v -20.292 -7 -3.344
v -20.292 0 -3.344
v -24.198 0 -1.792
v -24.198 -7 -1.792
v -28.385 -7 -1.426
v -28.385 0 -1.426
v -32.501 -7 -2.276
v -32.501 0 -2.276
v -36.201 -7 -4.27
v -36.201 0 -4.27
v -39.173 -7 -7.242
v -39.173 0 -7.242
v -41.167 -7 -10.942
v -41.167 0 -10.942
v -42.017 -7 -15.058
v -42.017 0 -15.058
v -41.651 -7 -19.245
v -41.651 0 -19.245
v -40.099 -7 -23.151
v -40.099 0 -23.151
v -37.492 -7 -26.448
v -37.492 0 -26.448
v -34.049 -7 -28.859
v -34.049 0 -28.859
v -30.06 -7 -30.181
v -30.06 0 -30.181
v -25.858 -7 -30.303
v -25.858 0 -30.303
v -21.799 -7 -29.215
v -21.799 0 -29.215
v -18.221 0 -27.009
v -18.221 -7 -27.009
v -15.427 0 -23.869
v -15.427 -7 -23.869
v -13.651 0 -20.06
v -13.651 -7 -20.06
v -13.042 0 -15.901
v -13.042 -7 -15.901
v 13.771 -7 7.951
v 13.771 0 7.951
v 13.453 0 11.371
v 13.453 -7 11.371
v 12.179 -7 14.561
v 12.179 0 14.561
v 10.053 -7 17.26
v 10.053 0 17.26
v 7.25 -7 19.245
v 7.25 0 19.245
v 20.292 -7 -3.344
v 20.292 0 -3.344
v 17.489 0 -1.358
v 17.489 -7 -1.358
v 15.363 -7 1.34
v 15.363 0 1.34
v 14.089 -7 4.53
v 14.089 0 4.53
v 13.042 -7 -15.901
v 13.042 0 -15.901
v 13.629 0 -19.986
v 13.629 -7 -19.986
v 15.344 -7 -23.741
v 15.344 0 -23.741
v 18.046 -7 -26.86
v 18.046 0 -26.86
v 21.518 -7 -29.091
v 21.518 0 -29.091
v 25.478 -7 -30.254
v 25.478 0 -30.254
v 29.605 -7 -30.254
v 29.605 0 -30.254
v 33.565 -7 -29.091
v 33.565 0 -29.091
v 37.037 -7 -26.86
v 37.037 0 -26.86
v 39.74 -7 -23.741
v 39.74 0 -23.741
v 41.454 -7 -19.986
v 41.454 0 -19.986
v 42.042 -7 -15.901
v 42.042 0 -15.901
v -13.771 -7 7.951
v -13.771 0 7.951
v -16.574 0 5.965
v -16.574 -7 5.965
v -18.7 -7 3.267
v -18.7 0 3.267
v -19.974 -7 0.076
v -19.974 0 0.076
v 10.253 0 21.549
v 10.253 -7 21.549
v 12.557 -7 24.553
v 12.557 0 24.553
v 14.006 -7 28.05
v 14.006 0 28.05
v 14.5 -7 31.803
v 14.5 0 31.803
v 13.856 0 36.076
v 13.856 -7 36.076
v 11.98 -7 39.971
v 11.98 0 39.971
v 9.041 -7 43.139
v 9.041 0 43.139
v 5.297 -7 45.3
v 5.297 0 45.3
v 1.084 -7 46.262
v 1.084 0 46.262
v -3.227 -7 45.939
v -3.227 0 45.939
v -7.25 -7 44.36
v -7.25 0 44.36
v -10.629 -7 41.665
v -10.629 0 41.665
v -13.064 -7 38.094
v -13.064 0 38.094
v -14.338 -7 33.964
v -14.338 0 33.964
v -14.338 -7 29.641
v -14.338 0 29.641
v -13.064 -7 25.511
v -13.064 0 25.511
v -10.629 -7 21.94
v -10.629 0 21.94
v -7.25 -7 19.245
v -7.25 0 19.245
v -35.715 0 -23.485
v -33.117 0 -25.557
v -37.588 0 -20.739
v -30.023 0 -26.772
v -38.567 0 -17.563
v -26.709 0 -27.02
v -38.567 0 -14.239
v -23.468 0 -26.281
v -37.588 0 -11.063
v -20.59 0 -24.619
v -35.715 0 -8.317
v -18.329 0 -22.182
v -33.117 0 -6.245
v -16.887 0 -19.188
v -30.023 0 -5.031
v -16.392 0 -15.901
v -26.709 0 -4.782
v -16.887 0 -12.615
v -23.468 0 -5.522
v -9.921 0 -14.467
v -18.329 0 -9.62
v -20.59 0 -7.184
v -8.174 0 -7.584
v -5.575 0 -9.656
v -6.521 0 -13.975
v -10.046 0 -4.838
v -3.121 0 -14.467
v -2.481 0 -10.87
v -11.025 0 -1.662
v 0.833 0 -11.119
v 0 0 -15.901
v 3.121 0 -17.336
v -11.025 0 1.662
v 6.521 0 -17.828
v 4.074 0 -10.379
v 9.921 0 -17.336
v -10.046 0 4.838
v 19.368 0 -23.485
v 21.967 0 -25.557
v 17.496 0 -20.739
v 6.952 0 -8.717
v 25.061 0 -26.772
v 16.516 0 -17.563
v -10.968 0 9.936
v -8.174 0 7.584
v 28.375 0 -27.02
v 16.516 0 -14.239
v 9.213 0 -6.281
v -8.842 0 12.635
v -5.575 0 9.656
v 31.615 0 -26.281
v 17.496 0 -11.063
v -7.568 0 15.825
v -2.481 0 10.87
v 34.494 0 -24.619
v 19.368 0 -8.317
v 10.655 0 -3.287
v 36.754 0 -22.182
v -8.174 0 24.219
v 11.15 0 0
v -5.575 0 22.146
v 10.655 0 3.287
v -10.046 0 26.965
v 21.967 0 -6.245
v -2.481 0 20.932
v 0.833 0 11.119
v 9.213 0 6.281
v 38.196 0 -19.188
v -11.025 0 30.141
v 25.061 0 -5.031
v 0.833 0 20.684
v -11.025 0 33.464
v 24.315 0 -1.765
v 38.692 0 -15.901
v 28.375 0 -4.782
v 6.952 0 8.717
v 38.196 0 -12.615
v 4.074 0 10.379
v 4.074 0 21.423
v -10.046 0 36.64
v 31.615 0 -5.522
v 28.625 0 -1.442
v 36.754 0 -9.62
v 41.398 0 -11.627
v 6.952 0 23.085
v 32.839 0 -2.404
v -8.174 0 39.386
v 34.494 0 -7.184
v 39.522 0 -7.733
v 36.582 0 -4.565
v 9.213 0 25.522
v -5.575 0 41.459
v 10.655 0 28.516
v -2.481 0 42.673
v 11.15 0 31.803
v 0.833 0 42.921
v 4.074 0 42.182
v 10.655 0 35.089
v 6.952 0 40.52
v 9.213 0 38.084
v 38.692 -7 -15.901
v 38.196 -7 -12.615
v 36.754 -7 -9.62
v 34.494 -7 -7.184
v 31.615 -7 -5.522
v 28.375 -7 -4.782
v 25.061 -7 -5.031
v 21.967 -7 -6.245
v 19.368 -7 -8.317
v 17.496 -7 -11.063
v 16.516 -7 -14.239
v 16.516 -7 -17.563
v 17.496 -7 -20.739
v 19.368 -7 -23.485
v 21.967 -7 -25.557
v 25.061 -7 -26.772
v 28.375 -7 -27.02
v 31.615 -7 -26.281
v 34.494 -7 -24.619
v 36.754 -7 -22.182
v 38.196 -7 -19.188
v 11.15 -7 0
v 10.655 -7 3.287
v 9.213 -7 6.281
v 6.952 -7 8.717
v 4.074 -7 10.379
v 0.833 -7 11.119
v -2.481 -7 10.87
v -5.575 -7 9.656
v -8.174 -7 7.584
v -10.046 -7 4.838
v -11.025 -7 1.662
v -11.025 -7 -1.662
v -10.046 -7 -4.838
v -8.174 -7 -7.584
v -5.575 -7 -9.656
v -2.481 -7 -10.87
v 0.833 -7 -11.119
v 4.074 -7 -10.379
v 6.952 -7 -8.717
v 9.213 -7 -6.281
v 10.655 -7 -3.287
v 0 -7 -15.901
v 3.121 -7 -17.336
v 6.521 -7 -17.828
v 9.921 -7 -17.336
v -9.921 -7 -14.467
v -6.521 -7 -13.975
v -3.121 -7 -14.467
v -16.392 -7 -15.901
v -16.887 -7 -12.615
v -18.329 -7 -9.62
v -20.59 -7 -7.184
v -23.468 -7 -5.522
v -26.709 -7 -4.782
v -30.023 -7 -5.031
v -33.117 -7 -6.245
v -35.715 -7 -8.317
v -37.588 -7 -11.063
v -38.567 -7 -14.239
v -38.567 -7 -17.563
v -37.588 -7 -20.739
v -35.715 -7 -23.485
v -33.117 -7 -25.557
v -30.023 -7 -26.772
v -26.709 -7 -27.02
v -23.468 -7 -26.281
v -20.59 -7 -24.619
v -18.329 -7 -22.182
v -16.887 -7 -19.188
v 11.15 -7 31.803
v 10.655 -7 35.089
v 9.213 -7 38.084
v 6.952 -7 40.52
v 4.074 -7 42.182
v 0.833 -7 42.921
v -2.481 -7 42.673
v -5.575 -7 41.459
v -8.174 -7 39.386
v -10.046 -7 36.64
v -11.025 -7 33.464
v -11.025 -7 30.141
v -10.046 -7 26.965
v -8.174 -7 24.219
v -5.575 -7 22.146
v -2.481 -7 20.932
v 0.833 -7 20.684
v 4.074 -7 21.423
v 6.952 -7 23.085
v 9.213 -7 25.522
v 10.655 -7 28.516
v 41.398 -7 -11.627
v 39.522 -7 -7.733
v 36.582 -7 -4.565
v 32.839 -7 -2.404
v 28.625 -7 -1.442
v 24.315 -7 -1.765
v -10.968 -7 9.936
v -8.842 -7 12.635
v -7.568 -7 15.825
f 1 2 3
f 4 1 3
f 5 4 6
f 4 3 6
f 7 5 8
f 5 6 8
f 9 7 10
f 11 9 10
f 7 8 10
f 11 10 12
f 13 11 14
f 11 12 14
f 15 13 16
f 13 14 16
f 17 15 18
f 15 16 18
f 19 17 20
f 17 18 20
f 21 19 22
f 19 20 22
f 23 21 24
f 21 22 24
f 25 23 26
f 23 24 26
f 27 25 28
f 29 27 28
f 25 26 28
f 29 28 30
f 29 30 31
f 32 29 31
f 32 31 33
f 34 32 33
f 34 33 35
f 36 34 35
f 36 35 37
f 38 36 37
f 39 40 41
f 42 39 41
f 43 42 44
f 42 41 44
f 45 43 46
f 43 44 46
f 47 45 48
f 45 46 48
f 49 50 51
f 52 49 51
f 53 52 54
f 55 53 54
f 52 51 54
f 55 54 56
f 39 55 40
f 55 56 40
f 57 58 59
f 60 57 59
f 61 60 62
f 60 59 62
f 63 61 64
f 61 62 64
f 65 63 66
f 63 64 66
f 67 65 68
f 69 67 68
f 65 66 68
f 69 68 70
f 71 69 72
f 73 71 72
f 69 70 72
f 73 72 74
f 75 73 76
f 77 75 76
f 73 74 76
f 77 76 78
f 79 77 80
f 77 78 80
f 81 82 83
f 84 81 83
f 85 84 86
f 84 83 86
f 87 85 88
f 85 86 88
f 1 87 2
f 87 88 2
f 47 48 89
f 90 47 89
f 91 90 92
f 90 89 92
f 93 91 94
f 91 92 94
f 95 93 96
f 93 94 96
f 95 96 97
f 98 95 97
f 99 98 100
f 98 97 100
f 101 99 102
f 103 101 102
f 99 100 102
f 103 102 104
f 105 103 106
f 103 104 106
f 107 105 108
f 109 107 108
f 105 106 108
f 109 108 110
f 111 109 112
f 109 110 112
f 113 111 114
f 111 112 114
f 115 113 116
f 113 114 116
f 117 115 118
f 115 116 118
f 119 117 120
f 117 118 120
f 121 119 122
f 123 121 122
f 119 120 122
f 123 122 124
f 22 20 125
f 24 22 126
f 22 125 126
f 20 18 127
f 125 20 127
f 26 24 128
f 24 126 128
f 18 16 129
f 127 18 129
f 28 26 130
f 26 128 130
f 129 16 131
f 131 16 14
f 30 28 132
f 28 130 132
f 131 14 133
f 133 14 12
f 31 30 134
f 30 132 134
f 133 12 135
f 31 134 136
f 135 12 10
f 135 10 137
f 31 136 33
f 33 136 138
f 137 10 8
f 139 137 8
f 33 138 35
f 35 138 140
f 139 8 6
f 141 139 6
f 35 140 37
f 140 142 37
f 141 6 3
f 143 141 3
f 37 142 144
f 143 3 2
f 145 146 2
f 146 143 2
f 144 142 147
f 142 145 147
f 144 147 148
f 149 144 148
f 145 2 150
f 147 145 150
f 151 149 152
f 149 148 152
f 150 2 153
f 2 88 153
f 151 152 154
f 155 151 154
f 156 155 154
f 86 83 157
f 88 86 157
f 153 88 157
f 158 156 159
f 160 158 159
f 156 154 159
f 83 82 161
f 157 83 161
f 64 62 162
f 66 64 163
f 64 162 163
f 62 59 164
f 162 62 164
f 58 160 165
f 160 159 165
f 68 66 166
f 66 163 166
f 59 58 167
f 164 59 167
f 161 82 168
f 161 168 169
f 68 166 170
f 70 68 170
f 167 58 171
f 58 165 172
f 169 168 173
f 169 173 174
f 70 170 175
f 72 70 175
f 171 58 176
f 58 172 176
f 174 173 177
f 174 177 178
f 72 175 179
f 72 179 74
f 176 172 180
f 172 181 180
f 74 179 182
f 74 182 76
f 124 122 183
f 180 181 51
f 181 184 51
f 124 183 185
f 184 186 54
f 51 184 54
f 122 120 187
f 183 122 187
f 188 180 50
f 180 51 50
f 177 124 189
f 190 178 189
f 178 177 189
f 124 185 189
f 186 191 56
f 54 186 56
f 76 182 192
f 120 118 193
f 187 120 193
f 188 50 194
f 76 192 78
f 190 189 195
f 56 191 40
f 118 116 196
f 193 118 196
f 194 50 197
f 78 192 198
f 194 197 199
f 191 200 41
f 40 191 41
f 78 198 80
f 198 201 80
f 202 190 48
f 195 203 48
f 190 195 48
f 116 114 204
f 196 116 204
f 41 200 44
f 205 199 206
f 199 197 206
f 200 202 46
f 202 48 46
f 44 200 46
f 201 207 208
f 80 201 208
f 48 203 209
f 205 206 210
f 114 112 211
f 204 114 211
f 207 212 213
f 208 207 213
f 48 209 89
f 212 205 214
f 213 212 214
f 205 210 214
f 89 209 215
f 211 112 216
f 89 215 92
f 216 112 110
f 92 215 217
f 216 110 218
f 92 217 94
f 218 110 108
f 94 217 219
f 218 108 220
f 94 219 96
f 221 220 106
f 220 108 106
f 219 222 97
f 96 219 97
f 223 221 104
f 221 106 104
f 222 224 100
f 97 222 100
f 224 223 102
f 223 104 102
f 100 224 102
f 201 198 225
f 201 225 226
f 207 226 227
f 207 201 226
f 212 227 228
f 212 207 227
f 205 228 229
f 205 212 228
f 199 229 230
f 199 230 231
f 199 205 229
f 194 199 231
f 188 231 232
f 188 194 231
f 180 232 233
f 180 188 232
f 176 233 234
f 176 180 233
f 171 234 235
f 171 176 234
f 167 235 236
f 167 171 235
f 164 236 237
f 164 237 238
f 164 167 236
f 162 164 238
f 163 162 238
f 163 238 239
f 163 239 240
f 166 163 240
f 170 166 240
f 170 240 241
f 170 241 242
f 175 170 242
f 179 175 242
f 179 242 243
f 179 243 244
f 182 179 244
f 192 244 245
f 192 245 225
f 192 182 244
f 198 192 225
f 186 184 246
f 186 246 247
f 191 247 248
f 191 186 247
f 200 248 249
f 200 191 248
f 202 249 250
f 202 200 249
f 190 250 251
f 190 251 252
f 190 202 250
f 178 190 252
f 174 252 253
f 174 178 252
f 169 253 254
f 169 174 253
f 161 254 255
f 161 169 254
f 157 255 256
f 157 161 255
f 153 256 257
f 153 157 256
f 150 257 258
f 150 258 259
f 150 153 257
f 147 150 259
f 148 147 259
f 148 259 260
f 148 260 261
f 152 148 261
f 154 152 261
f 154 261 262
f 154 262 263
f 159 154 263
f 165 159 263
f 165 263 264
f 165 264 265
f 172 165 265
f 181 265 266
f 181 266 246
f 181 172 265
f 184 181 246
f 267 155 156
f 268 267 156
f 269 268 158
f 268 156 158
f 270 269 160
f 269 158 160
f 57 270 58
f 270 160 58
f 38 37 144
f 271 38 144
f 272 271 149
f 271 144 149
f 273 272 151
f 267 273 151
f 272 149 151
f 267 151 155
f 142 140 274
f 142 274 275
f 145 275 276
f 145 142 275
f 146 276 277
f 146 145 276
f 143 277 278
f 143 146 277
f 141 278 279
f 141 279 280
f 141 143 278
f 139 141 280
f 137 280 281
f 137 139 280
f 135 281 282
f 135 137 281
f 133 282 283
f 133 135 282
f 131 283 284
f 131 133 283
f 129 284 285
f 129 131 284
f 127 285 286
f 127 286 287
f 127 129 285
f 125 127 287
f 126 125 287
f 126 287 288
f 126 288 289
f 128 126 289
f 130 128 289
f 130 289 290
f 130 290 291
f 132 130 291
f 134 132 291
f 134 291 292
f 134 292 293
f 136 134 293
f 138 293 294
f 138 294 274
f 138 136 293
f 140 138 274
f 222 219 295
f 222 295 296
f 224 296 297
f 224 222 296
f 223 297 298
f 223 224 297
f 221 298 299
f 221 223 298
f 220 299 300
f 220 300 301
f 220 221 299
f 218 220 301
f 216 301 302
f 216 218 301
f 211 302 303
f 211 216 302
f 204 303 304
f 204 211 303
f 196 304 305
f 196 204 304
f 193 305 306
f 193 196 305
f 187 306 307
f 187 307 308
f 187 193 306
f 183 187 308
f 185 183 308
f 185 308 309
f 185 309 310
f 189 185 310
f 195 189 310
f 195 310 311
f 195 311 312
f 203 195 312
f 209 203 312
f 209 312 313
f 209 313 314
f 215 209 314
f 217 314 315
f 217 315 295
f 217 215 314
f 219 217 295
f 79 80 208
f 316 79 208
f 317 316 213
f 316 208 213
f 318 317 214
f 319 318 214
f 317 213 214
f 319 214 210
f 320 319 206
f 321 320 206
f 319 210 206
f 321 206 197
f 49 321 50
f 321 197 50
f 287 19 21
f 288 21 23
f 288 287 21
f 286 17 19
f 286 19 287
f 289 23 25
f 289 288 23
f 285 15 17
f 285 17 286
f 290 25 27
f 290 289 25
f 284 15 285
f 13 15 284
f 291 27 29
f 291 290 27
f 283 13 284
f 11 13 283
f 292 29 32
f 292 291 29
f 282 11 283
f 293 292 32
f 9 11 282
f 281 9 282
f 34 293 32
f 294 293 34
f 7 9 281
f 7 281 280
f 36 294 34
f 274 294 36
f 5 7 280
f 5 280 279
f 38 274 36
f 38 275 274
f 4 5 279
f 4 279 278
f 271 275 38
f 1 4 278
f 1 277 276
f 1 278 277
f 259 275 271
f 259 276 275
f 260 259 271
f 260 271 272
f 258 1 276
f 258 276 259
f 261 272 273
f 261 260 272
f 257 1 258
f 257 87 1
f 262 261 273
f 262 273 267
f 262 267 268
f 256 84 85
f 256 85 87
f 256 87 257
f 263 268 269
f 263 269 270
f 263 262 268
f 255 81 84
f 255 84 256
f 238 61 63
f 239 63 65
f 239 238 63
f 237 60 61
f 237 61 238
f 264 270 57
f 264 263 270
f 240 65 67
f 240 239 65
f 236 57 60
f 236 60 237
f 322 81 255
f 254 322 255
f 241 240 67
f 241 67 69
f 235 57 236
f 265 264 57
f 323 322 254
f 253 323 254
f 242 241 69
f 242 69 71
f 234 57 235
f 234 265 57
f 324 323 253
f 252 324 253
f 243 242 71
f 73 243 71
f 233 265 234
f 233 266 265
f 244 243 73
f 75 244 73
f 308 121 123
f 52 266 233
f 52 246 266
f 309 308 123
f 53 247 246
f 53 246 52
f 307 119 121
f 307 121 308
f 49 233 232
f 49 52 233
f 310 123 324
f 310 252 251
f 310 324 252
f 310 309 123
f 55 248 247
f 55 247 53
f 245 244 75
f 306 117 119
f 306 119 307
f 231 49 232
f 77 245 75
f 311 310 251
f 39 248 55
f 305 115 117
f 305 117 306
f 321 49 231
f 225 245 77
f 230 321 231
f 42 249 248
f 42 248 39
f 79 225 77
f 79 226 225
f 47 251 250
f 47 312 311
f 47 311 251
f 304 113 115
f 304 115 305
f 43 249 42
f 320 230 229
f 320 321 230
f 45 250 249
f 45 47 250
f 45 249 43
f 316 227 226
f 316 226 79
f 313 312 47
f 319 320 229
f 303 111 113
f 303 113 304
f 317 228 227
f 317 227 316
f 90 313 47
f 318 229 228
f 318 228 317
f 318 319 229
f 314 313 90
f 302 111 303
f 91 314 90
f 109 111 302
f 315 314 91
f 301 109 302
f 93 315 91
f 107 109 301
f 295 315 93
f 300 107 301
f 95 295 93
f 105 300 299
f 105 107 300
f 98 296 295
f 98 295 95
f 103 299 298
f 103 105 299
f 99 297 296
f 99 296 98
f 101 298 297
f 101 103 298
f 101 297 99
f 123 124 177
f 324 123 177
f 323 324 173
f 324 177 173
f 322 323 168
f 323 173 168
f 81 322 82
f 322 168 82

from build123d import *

# Parameters (mm, degrees)
F0_R     = 11.15
F1_DEPTH = 7


with BuildPart() as f1:
    # F0 (on Front) → F1 (new body)
    with BuildSketch(Plane.XZ):
        with BuildLine():
            ThreePointArc((7.25, 19.245167), (12.557368, 24.552535), (14.5, 31.802535))
            ThreePointArc((14.5, 31.802535), (-7.25, 44.359903), (-7.25, 19.245167))
            ThreePointArc((-7.25, 19.245167), (0, 17.302535), (7.25, 19.245167))
        make_face()
        with Locations((0, 31.802535)):
            Circle(F0_R, mode=Mode.SUBTRACT)
        with BuildLine():
            ThreePointArc((7.25, 19.245167), (0, 17.302535), (-7.25, 19.245167))
            ThreePointArc((-7.25, 19.245167), (-8.842158, 12.634711), (-13.770902, 7.950634))
            ThreePointArc((-13.770902, 7.950634), (-18.699646, 3.266557), (-20.291803, -3.343899))
            ThreePointArc((-20.291803, -3.343899), (-14.984435, -8.651268), (-13.041803, -15.901268))
            ThreePointArc((-13.041803, -15.901268), (-6.520902, -13.974889), (0, -15.901268))
            ThreePointArc((0, -15.901268), (6.520902, -17.827646), (13.041803, -15.901268))
            ThreePointArc((13.041803, -15.901268), (14.984435, -8.651268), (20.291803, -3.343899))
            ThreePointArc((20.291803, -3.343899), (15.363059, 1.340178), (13.770902, 7.950634))
            ThreePointArc((13.770902, 7.950634), (12.178744, 14.56109), (7.25, 19.245167))
        make_face()
        Circle(F0_R, mode=Mode.SUBTRACT)
        with BuildLine():
            ThreePointArc((-13.041803, -15.901268), (-14.984435, -8.651268), (-20.291803, -3.343899))
            ThreePointArc((-20.291803, -3.343899), (-40.099172, -23.151268), (-13.041803, -15.901268))
        make_face()
        with Locations((-27.541803, -15.901268)):
            Circle(F0_R, mode=Mode.SUBTRACT)
        with BuildLine():
            ThreePointArc((42.041803, -15.901268), (34.791803, -3.343899), (20.291803, -3.343899))
            ThreePointArc((20.291803, -3.343899), (14.984435, -8.651268), (13.041803, -15.901268))
            ThreePointArc((13.041803, -15.901268), (27.541803, -30.401268), (42.041803, -15.901268))
        make_face()
        with Locations((27.541803, -15.901268)):
            Circle(F0_R, mode=Mode.SUBTRACT)
    extrude(amount=F1_DEPTH)


solid = f1.part
